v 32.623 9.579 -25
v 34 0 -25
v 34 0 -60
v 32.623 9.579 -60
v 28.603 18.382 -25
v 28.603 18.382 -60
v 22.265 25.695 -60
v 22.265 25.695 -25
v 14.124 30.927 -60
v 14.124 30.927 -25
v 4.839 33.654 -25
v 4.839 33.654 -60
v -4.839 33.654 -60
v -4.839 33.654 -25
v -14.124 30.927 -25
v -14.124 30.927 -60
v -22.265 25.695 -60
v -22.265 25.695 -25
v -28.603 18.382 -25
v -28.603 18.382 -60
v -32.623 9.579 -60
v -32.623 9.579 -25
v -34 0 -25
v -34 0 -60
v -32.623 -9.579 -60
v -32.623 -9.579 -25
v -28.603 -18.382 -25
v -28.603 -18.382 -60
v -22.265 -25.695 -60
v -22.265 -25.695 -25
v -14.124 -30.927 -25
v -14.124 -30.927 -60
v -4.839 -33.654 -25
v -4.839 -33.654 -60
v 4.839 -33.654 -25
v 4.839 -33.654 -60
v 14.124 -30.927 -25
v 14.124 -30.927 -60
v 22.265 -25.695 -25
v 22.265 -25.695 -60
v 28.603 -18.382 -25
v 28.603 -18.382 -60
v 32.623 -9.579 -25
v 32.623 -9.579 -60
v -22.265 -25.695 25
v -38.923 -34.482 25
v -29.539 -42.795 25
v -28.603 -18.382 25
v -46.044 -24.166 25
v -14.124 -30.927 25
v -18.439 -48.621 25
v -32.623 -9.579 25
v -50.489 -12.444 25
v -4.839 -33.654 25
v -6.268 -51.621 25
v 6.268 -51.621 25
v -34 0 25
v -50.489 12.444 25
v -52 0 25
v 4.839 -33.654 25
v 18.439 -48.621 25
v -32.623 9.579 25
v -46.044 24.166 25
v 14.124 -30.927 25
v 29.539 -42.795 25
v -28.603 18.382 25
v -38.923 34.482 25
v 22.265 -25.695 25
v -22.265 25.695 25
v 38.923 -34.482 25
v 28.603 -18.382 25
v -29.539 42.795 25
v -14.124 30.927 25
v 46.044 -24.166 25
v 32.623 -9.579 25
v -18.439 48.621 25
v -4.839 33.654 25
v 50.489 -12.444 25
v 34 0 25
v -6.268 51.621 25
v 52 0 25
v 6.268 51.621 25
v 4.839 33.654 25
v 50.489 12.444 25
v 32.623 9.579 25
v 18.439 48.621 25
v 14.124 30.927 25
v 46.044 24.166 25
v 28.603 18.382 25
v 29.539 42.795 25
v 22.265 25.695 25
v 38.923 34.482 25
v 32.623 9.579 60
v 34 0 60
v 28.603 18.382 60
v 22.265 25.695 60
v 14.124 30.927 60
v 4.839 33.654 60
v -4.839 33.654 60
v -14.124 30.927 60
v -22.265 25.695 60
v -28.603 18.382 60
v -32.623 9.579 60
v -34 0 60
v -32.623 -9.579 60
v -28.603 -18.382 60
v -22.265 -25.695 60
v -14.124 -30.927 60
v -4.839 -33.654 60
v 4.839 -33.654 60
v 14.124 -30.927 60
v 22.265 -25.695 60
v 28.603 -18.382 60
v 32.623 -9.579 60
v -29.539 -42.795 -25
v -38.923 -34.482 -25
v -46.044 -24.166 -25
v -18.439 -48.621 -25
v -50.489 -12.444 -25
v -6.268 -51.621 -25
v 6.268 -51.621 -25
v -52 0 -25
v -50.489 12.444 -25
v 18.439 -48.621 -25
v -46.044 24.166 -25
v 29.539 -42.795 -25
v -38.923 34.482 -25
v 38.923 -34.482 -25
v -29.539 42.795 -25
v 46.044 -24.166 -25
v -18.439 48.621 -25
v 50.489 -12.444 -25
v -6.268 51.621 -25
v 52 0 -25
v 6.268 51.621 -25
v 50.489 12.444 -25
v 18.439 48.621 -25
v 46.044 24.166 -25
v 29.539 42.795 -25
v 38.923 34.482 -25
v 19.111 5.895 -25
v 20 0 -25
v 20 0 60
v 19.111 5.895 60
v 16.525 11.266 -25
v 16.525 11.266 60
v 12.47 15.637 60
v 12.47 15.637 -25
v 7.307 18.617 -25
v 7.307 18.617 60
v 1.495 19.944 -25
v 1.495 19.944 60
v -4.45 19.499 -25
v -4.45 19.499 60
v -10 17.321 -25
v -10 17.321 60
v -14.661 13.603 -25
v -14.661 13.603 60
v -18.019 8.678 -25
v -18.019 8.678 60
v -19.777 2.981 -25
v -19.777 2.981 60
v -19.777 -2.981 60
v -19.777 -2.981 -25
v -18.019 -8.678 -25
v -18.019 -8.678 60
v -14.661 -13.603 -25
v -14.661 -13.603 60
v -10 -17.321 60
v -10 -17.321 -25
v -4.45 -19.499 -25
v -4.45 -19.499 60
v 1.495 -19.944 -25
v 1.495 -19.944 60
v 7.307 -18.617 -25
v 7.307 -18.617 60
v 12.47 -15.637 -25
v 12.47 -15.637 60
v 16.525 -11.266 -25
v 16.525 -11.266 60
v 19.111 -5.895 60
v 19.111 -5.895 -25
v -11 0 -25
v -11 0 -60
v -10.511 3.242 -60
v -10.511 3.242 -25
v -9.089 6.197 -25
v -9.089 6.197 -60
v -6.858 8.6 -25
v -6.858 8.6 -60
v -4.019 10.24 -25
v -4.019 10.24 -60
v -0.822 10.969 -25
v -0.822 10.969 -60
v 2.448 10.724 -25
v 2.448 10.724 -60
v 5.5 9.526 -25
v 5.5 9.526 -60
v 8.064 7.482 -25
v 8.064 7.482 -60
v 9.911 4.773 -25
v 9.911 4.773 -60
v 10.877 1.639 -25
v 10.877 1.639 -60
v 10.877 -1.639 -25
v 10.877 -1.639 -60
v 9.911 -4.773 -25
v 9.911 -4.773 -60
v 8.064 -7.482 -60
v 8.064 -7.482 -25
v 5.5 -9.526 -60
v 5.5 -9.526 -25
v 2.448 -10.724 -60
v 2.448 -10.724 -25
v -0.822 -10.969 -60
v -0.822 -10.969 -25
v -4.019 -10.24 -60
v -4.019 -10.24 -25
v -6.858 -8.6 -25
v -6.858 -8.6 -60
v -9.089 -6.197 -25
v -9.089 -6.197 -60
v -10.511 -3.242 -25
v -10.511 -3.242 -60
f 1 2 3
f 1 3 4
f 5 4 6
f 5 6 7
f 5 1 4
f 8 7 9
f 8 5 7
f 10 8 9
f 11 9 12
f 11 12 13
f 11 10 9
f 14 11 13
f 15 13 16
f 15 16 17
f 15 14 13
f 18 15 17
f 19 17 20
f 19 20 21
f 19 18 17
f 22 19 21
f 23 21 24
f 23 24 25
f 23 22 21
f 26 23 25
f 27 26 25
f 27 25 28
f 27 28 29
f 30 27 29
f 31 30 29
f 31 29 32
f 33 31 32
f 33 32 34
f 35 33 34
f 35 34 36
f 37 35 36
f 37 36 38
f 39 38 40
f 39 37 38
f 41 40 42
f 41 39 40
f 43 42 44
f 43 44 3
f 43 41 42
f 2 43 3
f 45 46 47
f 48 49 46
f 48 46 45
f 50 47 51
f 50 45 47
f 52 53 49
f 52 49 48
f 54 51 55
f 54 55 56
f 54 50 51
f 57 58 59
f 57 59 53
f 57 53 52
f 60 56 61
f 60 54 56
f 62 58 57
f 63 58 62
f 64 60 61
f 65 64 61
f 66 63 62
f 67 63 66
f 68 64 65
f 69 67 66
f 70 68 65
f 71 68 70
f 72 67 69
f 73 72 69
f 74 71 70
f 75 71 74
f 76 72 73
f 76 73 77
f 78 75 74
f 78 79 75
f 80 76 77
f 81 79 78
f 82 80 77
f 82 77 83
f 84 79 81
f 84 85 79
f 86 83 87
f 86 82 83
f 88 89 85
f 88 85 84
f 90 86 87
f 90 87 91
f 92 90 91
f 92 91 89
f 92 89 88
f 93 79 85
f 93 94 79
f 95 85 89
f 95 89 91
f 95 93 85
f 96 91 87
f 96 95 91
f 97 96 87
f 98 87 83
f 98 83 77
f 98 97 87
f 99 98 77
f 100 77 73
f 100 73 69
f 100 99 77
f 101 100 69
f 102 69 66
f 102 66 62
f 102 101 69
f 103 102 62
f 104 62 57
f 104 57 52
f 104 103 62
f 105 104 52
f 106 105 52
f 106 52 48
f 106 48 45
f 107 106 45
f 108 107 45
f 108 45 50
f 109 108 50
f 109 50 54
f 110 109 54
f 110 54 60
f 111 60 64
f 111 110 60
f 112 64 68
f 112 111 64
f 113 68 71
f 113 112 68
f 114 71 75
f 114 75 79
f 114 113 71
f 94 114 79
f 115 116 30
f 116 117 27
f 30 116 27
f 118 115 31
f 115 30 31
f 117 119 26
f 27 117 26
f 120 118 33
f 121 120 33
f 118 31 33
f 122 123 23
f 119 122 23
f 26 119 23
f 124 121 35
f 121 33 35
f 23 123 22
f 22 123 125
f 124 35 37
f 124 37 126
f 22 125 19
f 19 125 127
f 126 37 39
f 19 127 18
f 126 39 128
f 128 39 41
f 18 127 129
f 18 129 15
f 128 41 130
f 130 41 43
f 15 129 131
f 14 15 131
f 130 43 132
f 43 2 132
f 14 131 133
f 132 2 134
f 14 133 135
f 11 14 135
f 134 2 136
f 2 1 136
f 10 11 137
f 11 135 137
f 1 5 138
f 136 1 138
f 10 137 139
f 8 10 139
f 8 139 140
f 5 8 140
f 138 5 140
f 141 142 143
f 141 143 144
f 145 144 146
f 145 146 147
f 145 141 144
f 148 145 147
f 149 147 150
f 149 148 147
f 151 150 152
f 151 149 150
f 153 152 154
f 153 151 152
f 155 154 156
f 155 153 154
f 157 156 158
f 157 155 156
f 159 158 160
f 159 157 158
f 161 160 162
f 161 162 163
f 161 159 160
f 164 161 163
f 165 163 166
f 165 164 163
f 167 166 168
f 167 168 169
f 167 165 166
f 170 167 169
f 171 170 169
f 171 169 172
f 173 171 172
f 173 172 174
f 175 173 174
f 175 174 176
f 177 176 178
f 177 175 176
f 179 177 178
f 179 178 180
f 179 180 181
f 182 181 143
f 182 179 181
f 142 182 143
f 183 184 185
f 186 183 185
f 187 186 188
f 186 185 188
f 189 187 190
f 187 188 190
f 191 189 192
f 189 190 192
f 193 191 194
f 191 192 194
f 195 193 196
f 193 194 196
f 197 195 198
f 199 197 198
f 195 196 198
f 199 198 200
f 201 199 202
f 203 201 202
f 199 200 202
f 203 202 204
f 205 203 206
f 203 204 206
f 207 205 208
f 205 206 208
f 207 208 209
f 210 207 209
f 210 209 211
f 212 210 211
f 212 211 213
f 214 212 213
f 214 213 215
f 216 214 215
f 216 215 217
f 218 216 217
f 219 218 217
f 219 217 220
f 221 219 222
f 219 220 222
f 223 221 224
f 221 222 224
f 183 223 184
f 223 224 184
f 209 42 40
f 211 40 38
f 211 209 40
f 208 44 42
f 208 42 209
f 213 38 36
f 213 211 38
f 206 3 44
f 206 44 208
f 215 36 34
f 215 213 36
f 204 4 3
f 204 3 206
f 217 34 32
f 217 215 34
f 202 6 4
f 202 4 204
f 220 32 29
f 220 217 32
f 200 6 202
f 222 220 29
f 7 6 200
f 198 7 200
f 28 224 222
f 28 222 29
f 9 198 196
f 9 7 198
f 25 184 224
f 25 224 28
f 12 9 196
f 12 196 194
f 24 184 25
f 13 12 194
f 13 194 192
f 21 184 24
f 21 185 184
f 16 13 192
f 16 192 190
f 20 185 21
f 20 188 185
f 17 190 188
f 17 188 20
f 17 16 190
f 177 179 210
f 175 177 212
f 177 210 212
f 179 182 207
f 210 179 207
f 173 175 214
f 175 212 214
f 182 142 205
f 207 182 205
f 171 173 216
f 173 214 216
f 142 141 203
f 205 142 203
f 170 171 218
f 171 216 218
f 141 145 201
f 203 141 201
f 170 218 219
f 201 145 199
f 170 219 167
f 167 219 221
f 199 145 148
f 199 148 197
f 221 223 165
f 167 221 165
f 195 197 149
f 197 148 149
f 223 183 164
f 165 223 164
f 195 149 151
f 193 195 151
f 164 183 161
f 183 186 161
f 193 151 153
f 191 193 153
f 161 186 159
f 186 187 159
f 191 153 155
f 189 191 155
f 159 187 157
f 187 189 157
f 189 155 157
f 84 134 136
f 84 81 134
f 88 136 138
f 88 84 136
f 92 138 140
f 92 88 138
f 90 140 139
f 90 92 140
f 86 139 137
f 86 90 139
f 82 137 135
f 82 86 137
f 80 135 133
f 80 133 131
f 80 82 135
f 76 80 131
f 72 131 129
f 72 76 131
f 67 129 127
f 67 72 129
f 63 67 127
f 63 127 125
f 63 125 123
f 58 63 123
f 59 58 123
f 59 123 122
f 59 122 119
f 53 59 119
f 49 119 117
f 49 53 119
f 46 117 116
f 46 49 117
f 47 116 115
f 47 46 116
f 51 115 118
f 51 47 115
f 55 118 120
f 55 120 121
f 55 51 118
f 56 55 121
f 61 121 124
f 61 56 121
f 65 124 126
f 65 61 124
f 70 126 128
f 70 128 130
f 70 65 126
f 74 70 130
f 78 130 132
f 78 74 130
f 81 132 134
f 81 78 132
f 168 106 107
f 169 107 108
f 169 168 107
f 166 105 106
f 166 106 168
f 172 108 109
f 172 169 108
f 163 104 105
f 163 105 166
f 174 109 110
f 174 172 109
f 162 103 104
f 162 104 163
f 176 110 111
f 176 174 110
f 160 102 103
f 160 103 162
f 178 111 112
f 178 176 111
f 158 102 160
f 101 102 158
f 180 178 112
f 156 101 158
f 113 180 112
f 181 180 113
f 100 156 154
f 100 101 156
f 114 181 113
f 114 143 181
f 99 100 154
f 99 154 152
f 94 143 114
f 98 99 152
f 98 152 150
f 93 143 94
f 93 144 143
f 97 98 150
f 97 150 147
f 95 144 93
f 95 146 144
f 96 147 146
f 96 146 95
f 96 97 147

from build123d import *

# Parameters (mm, degrees)
SKETCH_1_R      = 52
SKETCH_1_R_2    = 34
EXTRUDE_1_DEPTH = 25
SKETCH_1_3_R    = 34
SKETCH_1_3_R_2  = 20
EXTRUDE_2_DEPTH = 60
SKETCH_2_R      = 20
SKETCH_2_R_2    = 11
EXTRUDE_3_DEPTH = 35


with BuildPart() as part:
    # 草图1 → 凸台-拉伸1 (new, symmetric)
    with BuildSketch(Plane.XY):
        Circle(SKETCH_1_R)
        Circle(SKETCH_1_R_2, mode=Mode.SUBTRACT)
    extrude(amount=EXTRUDE_1_DEPTH, both=True)

    # 草图1<3> → 凸台-拉伸2 (add, symmetric)
    with BuildSketch(Plane.XY):
        Circle(SKETCH_1_3_R)
        Circle(SKETCH_1_3_R_2, mode=Mode.SUBTRACT)
    extrude(amount=EXTRUDE_2_DEPTH, both=True)

    # 草图2 → 凸台-拉伸3 (add)
    with BuildSketch(Plane(origin=(0, 0, -60), x_dir=(-1, 0, 0), z_dir=(0, 0, -1))):
        Circle(SKETCH_2_R)
        Circle(SKETCH_2_R_2, mode=Mode.SUBTRACT)
    extrude(amount=-EXTRUDE_3_DEPTH)


solid = part.part
